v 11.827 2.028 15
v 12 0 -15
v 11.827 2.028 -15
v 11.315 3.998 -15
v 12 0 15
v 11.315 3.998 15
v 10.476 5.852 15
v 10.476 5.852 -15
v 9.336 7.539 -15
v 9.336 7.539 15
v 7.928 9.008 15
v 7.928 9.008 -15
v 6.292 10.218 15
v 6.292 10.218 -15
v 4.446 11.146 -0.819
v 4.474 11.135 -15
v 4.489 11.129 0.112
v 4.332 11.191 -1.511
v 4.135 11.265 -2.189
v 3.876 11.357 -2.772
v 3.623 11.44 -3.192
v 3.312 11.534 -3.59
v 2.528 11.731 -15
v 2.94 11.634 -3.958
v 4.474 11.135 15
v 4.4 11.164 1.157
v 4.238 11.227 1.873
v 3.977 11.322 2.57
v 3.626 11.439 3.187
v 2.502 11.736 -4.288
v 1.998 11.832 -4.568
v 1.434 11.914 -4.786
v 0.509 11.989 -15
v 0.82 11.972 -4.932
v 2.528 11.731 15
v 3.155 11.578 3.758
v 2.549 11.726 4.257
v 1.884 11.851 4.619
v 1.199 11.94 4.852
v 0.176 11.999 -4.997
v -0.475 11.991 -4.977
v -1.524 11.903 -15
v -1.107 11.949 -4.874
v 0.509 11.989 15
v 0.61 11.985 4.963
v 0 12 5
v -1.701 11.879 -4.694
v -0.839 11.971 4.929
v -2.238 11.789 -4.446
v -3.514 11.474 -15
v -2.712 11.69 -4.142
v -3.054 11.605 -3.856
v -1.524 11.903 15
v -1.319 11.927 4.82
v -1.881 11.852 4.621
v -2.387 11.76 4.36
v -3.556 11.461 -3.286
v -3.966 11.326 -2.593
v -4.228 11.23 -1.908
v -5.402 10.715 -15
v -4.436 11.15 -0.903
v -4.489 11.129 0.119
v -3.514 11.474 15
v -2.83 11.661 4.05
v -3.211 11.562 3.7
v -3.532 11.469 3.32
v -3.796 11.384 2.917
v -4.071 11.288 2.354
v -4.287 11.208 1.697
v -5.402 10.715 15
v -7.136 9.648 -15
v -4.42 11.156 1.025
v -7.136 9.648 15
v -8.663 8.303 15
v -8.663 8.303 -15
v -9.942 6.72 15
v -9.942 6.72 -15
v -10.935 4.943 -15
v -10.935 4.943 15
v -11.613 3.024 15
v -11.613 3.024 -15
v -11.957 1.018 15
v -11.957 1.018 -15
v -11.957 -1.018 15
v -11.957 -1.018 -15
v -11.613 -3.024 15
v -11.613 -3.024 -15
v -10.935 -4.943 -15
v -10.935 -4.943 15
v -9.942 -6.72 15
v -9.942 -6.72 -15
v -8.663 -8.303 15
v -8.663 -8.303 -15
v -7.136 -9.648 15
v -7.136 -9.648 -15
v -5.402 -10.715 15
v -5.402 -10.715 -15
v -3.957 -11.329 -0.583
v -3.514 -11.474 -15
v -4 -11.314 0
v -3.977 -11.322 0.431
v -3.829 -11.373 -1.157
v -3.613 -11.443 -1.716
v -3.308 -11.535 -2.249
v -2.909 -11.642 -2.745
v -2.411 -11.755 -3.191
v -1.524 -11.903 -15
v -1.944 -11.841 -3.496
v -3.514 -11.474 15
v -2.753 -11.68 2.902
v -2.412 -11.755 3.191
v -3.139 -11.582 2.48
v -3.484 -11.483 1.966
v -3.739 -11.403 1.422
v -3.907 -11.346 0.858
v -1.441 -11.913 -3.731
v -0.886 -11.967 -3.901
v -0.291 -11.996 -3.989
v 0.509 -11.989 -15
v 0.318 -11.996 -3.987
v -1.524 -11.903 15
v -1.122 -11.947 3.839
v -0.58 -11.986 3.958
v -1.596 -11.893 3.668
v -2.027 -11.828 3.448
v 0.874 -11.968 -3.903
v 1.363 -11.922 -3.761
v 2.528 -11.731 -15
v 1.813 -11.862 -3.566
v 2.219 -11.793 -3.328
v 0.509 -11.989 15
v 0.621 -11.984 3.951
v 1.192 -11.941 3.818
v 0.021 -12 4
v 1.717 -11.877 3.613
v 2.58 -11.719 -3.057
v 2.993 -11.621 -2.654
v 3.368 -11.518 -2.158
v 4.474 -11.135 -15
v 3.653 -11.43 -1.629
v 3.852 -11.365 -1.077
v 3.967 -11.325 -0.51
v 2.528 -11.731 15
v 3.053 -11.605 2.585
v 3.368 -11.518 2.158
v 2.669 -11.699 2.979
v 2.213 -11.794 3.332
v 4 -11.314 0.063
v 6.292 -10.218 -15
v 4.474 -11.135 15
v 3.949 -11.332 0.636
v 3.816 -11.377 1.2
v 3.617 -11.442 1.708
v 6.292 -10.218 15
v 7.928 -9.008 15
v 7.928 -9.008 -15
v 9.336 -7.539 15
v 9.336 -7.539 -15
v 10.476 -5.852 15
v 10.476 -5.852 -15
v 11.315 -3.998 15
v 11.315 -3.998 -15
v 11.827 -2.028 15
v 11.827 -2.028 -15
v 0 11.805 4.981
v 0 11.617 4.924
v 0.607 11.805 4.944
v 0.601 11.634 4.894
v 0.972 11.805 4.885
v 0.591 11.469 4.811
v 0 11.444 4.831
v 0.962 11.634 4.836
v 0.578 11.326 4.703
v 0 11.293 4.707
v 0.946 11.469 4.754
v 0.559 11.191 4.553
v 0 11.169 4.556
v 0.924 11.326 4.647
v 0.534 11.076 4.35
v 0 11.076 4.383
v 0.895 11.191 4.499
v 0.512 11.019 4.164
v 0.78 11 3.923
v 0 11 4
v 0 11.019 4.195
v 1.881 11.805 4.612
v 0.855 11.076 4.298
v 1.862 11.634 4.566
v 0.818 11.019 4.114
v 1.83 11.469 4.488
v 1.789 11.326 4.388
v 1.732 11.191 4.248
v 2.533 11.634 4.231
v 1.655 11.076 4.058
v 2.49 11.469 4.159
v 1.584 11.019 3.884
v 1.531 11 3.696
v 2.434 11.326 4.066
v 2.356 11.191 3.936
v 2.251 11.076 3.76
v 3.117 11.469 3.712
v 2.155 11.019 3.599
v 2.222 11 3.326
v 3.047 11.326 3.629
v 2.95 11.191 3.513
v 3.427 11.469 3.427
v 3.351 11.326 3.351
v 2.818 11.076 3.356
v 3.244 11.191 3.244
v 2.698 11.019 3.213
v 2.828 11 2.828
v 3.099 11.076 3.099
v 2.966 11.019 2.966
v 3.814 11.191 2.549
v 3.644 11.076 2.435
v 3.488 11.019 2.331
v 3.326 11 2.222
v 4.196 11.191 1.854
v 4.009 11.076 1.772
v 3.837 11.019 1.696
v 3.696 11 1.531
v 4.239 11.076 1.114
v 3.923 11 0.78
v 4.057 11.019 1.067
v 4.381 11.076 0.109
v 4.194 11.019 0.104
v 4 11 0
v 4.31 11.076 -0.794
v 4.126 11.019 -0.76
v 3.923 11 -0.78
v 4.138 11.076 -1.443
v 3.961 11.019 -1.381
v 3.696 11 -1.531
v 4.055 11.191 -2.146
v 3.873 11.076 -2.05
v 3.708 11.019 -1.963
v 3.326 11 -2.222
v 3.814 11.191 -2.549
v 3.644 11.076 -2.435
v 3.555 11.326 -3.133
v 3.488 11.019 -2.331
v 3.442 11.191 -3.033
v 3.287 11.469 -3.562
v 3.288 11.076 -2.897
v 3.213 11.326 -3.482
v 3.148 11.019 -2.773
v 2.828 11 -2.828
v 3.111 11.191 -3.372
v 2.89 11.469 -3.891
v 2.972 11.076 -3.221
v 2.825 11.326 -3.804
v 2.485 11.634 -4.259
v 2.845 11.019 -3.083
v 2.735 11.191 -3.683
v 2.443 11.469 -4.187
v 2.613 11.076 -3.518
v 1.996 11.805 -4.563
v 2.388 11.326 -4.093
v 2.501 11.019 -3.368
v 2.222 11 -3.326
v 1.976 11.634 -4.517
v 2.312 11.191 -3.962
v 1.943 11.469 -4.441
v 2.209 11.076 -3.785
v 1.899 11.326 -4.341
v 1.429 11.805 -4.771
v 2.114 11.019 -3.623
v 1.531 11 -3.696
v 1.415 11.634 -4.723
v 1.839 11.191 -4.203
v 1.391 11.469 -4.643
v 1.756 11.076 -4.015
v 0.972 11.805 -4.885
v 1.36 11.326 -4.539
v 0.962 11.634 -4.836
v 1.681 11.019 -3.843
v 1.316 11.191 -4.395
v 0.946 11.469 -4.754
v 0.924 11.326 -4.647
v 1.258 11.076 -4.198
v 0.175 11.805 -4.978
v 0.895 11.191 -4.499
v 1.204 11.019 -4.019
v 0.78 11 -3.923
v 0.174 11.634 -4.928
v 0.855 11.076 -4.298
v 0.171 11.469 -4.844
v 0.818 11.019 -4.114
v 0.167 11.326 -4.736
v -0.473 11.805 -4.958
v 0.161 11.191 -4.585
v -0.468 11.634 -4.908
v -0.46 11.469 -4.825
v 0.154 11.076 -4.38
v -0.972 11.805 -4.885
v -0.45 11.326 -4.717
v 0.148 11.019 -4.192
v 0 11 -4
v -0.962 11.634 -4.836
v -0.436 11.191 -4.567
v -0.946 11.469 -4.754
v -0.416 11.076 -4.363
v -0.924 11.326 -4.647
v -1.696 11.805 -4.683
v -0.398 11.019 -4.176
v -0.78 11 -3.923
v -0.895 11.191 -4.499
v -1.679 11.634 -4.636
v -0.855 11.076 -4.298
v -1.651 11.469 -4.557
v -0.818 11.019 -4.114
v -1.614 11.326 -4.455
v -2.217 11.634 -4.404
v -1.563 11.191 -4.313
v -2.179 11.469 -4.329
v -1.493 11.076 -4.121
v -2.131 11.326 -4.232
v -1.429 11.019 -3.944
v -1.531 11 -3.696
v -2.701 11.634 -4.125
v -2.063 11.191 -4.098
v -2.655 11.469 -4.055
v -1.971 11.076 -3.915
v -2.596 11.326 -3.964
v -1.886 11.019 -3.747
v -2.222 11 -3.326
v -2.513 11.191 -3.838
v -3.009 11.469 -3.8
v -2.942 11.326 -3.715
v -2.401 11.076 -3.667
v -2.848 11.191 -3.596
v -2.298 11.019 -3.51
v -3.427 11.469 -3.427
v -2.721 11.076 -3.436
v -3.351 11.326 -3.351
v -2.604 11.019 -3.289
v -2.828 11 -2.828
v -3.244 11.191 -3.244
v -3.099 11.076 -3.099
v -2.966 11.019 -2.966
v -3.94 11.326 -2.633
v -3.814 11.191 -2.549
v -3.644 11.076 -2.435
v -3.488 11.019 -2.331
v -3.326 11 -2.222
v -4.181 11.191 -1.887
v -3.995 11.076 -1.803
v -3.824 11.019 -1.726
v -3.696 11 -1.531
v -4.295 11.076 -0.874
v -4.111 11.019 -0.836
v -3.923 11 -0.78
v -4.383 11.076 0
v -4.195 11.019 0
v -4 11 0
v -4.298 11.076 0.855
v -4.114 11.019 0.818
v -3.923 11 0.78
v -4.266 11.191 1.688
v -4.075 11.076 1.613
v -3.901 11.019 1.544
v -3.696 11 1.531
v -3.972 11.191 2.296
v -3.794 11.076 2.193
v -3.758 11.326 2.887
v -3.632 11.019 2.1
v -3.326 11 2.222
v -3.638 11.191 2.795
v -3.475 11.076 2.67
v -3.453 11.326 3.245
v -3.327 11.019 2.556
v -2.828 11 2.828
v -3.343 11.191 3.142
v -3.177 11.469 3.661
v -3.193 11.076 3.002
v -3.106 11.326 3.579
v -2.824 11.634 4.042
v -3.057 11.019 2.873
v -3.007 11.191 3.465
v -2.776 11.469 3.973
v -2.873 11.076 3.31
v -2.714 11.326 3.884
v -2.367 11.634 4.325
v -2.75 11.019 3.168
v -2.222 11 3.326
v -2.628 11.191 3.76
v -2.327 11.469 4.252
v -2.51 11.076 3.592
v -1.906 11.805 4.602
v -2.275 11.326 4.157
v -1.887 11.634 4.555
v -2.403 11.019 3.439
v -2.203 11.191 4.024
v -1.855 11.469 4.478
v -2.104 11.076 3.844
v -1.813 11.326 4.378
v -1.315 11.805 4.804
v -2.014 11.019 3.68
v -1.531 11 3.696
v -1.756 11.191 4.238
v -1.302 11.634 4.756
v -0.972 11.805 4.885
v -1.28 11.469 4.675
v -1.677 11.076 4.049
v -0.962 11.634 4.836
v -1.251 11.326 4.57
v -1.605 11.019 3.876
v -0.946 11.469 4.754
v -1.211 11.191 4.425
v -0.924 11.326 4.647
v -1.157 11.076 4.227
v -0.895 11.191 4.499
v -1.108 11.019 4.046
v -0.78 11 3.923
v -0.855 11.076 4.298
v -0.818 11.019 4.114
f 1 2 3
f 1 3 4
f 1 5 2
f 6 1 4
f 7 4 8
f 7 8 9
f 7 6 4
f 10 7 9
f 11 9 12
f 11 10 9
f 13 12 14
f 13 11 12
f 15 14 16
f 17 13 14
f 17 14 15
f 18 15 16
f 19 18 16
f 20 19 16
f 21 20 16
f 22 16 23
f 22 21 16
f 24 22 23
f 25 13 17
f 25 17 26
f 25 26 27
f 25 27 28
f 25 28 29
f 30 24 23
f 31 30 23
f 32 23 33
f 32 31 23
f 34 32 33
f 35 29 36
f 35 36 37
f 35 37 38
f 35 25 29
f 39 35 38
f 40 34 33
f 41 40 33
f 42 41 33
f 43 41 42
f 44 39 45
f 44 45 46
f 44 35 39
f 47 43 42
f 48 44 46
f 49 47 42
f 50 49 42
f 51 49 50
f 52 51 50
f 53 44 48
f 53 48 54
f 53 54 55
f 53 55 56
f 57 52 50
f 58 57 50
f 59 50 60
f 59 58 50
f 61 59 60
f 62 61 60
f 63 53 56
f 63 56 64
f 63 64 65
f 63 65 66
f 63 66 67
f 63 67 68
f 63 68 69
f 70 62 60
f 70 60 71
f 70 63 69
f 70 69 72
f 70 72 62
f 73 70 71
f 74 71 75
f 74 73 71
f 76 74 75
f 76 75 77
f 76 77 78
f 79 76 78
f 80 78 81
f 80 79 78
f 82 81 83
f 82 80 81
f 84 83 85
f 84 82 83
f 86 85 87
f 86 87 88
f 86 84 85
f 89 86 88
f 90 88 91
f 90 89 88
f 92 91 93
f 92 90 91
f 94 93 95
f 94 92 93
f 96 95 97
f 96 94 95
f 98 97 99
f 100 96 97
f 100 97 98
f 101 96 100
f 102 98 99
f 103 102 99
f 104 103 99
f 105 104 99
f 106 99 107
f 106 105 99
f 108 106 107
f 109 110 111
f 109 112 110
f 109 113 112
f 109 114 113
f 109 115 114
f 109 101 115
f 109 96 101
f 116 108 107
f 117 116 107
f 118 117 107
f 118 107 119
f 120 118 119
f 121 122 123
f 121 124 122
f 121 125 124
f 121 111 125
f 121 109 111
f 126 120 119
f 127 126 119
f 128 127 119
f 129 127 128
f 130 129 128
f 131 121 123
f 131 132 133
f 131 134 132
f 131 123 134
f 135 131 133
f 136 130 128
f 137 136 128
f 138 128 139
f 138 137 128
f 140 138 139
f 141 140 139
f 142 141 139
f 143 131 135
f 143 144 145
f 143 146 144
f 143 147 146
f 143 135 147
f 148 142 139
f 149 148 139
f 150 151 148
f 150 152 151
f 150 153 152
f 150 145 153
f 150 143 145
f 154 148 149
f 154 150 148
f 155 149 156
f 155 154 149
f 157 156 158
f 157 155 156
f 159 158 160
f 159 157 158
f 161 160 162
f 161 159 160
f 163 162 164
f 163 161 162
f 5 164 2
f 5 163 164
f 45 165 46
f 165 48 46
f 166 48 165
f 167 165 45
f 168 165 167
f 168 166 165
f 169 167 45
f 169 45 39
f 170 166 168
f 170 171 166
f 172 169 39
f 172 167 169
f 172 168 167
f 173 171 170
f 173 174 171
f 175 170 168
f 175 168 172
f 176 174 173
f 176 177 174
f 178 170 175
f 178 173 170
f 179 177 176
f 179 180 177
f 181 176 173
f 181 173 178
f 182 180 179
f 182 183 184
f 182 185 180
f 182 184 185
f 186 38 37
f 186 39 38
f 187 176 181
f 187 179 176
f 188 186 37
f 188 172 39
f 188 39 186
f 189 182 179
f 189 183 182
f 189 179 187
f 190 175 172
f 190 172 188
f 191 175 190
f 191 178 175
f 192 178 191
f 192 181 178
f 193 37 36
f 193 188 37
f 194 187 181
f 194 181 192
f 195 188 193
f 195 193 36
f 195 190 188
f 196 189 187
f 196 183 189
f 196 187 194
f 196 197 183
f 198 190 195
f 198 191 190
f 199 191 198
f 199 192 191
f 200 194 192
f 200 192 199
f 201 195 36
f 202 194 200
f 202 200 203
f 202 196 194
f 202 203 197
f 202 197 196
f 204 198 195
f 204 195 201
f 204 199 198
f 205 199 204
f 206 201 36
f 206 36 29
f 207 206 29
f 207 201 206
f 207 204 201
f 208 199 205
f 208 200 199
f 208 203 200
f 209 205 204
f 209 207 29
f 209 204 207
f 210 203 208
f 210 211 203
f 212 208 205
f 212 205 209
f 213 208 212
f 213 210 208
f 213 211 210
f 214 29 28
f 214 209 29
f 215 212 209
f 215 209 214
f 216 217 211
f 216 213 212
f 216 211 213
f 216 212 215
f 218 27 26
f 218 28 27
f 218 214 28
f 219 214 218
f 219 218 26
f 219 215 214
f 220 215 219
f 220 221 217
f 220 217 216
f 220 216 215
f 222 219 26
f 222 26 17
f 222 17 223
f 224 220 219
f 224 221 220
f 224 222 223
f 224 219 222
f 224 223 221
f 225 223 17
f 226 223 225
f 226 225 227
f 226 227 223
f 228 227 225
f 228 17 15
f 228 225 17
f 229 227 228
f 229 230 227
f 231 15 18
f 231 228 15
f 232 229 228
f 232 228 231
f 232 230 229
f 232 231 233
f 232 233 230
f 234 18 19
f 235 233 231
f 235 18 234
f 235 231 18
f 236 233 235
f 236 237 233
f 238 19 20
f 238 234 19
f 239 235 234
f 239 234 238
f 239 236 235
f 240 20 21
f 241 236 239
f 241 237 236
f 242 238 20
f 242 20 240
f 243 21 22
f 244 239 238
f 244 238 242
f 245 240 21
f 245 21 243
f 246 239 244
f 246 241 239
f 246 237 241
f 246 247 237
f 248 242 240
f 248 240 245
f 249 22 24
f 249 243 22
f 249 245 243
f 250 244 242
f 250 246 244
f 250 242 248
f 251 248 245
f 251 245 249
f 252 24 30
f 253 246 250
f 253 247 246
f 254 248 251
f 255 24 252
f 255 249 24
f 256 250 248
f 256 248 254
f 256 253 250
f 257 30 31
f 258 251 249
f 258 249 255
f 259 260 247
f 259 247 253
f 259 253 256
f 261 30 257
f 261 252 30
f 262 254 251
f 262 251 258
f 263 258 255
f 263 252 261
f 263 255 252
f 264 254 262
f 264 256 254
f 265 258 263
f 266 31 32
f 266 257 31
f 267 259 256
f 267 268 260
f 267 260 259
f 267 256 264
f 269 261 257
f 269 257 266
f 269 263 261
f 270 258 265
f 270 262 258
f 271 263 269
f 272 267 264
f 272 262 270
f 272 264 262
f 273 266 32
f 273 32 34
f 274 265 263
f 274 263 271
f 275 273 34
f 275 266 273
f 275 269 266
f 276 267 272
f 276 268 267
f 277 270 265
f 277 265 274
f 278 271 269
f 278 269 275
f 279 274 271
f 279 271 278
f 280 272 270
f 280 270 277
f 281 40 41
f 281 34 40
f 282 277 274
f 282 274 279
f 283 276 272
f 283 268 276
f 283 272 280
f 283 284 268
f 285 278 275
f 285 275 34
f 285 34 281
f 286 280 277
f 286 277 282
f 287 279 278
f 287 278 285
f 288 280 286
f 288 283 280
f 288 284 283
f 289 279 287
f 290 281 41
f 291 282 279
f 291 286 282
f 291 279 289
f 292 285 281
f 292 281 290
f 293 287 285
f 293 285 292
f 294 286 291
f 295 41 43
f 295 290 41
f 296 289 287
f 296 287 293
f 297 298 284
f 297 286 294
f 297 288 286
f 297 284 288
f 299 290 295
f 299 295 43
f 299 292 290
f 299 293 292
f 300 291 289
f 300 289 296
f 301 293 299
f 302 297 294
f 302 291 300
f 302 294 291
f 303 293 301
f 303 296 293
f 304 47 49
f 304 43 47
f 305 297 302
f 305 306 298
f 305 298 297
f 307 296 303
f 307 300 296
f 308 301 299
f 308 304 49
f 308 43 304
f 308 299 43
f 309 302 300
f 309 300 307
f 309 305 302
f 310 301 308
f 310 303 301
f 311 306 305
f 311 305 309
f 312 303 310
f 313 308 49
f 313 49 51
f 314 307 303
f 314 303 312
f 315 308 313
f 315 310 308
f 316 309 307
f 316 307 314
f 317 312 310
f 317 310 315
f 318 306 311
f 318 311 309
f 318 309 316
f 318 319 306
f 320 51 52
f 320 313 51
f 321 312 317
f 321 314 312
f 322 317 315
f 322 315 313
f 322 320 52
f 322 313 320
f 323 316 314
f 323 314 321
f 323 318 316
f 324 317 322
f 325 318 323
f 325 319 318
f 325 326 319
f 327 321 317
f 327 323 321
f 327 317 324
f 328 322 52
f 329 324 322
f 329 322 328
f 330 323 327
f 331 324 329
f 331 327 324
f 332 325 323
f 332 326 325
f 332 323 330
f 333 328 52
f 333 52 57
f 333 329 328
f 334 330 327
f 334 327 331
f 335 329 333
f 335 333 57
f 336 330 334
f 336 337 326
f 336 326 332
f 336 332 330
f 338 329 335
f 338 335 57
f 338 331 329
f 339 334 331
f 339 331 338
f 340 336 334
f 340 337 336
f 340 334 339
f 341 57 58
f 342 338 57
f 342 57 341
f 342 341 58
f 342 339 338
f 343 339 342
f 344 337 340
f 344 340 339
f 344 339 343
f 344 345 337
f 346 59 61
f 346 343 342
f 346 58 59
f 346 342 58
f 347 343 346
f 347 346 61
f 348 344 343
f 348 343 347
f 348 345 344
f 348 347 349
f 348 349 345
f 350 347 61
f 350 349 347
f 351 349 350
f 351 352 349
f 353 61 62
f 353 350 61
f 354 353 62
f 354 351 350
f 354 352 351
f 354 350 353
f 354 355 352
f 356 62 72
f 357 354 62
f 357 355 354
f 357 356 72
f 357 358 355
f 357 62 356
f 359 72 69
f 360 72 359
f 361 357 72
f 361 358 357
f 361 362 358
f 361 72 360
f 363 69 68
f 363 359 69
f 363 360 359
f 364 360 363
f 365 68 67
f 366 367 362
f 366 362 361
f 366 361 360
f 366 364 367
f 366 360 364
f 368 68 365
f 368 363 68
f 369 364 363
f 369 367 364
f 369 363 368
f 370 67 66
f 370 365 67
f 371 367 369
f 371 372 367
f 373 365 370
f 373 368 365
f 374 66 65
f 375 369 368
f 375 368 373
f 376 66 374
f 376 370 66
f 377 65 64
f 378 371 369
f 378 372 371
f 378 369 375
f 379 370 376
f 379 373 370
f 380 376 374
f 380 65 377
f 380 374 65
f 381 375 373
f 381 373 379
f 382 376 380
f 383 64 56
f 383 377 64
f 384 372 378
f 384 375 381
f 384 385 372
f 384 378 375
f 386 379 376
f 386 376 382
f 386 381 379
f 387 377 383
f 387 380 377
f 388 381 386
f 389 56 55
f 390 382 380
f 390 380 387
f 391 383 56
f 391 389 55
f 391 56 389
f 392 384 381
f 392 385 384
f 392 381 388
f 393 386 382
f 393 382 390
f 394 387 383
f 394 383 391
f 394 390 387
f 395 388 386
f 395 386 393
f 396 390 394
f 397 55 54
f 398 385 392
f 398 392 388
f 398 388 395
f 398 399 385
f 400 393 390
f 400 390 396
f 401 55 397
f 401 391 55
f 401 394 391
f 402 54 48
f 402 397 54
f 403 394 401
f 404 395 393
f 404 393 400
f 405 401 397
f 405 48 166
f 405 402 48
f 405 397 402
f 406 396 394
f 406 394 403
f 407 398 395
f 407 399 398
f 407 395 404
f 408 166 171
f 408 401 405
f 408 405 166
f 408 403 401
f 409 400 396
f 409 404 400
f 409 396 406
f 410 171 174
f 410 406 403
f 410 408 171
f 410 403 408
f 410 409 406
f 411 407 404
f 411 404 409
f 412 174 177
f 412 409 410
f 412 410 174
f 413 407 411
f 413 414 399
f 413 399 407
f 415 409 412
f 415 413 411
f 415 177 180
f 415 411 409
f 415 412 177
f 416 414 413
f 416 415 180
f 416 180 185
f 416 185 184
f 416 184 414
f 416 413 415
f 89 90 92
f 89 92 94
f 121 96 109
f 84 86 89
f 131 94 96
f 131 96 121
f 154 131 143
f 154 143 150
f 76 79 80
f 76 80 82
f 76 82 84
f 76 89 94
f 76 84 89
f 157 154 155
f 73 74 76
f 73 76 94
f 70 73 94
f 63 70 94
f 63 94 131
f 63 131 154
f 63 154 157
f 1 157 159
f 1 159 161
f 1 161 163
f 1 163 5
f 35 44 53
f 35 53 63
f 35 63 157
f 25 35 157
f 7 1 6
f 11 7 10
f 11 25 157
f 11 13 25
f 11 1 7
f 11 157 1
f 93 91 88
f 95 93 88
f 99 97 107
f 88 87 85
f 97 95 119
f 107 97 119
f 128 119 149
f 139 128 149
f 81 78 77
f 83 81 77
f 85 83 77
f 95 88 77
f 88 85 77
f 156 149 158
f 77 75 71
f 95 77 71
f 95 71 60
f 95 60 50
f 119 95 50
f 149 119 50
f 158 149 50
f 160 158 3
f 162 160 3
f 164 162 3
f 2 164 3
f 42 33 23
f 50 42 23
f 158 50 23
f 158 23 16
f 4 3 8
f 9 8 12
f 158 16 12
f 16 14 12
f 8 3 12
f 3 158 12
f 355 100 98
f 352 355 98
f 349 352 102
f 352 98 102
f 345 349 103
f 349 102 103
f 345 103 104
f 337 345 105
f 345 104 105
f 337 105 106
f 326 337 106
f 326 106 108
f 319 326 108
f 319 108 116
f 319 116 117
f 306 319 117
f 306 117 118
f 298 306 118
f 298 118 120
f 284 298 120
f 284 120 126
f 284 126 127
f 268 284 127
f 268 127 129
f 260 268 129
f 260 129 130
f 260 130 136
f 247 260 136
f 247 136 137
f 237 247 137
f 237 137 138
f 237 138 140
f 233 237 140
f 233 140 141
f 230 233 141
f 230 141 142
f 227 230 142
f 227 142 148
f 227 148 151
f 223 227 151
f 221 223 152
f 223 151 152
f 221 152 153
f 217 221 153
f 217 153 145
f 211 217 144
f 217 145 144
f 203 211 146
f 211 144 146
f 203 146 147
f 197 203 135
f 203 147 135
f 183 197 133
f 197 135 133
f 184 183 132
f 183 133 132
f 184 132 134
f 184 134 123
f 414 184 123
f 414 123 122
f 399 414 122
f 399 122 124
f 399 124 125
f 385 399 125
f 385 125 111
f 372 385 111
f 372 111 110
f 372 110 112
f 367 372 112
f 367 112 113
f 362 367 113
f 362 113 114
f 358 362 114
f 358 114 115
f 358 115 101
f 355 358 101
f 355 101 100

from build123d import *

# Parameters (mm, degrees)
SZKIC1_R                    = 12
DODANIE_WYCI_GNI_CIE1_DEPTH = 15
OTW_R_8_0_8_1_D             = 8
SZKIC5_R                    = 1


with BuildPart() as part:
    # Szkic1 → Dodanie-wyci_gni_cie1 (new body, symmetric)
    with BuildSketch(Plane.XY):
        Circle(SZKIC1_R)
    extrude(amount=DODANIE_WYCI_GNI_CIE1_DEPTH, both=True)

    # Otw_r _8.0 _8_1 (through all)
    with Locations(Plane(origin=(0, 12, 0), x_dir=(1, 0, 0), z_dir=(0, 1, 0))):
        with Locations((0, 0)):
            Hole(OTW_R_8_0_8_1_D / 2)

    # Szkic5 → Wyci_cie-obr_t1 (revolve, cut)
    with BuildSketch(Plane(origin=(0, 0, 0), x_dir=(0, 0, -1), z_dir=(1, 0, 0))):
        with Locations((-4, 12)):
            Circle(SZKIC5_R)
    revolve(axis=Axis((0, -12, 0), (0, 1, 0)), mode=Mode.SUBTRACT)


solid = part.part
